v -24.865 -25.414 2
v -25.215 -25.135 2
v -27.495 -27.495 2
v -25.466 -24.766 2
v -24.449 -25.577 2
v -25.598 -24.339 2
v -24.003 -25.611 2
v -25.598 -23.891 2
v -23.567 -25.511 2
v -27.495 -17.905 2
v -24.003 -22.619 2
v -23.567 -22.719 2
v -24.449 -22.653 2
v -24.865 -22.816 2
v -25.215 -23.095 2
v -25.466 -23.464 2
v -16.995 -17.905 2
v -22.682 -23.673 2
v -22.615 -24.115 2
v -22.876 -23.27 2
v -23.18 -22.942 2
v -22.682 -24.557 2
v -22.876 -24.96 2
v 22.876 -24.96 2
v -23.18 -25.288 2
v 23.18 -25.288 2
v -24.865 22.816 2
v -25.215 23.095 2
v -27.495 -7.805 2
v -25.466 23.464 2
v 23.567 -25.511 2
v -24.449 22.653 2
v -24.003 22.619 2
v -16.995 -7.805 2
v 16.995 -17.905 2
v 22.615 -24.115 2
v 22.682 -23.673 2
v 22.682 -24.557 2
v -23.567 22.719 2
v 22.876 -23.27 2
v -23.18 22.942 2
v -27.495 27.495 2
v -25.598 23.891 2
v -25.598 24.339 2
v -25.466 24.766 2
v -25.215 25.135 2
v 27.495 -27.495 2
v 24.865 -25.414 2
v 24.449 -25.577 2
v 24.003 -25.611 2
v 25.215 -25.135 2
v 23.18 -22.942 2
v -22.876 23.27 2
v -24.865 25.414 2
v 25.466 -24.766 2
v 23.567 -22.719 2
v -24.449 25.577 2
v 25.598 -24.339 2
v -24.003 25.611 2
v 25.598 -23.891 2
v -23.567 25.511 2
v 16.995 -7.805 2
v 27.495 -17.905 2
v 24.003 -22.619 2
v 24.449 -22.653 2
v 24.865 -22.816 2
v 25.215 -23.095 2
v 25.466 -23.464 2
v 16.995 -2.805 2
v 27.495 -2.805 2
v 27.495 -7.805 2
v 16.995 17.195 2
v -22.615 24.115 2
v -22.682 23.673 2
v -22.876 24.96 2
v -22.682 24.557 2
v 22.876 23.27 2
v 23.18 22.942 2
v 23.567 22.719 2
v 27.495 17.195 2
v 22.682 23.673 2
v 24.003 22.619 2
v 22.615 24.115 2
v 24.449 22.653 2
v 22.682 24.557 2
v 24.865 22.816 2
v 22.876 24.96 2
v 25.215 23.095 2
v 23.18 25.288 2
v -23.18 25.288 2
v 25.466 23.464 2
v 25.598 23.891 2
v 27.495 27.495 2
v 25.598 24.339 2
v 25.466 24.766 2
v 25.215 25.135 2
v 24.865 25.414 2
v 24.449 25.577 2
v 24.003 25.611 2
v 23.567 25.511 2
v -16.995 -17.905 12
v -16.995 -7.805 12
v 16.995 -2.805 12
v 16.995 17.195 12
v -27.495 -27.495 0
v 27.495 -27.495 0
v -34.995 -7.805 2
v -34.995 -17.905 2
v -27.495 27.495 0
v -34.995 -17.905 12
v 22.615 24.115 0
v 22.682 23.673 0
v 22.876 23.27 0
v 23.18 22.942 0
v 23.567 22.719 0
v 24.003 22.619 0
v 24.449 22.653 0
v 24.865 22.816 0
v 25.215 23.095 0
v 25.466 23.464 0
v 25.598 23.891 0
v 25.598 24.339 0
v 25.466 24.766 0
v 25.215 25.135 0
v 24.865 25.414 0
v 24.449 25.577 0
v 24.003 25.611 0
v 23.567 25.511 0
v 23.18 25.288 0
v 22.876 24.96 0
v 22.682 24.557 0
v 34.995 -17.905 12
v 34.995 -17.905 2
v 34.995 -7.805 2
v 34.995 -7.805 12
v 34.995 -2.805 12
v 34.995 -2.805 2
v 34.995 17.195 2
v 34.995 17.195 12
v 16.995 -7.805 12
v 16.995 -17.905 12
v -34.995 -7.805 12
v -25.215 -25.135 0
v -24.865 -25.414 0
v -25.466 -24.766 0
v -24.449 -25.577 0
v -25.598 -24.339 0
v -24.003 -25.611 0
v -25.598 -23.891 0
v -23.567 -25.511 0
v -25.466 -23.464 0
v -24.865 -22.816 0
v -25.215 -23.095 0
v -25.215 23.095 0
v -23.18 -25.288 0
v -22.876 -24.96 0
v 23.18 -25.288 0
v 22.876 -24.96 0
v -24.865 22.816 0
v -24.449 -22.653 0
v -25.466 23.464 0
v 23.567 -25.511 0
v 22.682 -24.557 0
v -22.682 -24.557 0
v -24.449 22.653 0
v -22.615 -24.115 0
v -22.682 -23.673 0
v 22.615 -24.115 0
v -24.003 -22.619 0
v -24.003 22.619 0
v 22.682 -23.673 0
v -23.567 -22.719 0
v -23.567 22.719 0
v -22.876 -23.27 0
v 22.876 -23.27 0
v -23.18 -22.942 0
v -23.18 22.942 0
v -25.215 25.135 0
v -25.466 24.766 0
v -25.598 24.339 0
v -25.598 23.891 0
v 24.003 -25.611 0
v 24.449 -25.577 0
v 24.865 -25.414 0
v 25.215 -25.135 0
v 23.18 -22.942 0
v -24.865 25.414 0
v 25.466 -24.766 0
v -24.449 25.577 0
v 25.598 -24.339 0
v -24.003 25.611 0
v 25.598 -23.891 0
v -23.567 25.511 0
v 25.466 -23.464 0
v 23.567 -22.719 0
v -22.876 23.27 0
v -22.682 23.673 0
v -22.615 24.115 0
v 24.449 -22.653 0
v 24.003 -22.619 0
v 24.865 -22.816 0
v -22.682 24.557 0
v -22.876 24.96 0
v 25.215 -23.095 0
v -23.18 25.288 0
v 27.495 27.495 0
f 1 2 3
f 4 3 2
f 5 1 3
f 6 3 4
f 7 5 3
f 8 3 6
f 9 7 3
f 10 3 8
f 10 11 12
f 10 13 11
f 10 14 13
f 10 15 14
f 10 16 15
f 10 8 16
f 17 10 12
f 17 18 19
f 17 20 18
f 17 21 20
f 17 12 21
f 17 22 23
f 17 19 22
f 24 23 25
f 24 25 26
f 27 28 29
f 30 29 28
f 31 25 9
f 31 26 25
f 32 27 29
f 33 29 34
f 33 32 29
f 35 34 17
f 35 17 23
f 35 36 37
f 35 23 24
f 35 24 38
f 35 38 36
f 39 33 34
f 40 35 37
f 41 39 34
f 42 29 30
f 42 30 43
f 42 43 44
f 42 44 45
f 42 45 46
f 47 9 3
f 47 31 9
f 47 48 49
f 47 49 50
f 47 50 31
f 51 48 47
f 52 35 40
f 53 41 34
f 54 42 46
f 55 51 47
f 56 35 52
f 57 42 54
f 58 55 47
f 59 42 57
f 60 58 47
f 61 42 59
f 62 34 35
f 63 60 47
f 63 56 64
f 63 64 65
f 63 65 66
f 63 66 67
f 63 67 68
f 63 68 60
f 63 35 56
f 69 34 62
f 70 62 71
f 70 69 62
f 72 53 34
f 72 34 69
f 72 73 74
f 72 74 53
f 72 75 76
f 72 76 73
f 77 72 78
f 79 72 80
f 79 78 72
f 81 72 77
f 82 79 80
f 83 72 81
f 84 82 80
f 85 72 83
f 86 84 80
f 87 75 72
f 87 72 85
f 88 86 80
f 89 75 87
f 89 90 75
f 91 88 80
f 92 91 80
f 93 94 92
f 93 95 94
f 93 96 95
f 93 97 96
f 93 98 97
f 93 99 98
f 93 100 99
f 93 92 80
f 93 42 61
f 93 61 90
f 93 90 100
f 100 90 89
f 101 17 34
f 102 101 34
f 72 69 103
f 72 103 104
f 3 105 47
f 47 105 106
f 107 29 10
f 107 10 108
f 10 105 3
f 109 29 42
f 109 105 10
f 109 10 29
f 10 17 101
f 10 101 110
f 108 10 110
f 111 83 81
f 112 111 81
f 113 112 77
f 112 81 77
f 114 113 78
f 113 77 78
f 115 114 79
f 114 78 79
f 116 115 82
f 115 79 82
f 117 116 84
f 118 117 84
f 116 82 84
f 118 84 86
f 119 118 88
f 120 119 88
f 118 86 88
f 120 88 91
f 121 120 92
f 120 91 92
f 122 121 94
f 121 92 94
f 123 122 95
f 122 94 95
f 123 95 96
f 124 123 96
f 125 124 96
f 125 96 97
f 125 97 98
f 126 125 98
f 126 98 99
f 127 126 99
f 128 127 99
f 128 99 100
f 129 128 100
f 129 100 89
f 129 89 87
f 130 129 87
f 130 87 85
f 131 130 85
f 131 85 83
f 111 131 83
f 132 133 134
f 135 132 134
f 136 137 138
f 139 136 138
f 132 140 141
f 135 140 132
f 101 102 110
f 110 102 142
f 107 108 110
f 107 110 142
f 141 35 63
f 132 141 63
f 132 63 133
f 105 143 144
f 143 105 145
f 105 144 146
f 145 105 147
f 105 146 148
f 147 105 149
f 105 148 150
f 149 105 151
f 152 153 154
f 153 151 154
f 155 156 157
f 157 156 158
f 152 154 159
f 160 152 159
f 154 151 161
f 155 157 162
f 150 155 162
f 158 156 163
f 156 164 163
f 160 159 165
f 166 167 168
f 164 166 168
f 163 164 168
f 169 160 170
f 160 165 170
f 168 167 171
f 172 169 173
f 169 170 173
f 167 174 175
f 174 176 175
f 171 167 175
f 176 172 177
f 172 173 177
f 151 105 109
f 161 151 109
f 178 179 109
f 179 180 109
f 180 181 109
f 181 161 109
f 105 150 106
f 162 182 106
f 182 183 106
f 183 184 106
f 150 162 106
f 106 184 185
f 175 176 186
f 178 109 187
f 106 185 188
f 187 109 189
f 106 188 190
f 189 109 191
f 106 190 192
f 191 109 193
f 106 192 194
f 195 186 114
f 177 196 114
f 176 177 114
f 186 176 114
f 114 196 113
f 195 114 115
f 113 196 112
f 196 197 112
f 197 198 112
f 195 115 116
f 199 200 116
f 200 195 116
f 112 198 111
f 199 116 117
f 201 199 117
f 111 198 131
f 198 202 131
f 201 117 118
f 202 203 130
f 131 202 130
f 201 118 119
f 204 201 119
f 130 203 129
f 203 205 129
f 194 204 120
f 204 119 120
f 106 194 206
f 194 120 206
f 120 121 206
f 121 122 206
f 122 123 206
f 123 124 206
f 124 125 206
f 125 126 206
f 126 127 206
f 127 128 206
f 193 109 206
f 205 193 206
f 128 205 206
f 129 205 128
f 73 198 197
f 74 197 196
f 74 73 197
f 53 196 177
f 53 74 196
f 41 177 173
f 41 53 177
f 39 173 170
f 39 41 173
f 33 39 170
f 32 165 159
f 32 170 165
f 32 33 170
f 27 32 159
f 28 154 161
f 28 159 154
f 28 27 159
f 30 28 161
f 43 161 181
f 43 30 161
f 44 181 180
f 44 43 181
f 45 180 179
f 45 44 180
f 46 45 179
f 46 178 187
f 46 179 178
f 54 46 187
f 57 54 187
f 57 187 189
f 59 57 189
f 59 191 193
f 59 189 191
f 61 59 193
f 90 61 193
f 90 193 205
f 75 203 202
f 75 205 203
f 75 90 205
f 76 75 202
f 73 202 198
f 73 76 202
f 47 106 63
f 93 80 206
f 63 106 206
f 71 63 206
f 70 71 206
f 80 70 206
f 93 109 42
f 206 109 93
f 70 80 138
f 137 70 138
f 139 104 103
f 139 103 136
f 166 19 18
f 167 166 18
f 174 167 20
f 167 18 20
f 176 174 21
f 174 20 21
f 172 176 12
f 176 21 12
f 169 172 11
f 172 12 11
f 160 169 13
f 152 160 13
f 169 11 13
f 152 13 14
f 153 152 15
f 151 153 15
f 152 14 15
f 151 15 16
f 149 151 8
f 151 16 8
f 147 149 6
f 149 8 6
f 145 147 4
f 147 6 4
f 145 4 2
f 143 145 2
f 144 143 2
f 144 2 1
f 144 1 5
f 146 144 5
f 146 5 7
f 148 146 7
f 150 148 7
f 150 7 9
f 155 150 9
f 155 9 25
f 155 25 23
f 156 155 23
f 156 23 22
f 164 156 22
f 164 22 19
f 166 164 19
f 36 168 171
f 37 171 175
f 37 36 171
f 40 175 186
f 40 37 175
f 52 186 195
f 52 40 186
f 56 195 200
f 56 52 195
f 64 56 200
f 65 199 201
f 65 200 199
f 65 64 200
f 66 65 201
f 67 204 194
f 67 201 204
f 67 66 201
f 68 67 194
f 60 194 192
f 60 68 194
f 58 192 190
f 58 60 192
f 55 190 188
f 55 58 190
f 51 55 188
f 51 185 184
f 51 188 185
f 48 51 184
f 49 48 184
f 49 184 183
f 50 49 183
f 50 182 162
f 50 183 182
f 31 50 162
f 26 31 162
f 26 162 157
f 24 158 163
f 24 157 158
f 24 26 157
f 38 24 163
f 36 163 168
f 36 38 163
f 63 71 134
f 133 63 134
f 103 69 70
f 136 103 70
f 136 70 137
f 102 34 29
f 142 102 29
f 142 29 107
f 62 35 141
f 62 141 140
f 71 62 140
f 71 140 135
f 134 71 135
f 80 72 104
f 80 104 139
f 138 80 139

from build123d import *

# Parameters (mm, degrees)
SKETCH_2_W               = 54.99
SKETCH_2_H               = 54.99
EXTRUDE_1_DEPTH          = 2
SKETCH_3_R               = 1.5
CUT_EXTRUDE_1_DEPTH      = 39.935203223
MIRROR_2_COPY_1_SKETCH_R = 1.5
MIRROR_2_COPY_1_DEPTH    = 39.935203223
MIRROR_2_COPY_2_SKETCH_R = 1.5
MIRROR_2_COPY_2_DEPTH    = 39.935203223
SKETCH_4_W               = 18
SKETCH_4_H               = 20
EXTRUDE_2_DEPTH          = 10
SKETCH_5_W               = 18
SKETCH_5_H               = 10.1
EXTRUDE_3_DEPTH          = 10


with BuildPart() as part:
    # 草圖2 → 填料-伸長1 (new body)
    with BuildSketch(Plane.XY):
        Rectangle(SKETCH_2_W, SKETCH_2_H)
    extrude(amount=EXTRUDE_1_DEPTH)

    # 草圖3 → 除料-伸長1 (cut, through all)
    with BuildSketch(Plane.XY.offset(2)):
        with Locations((-24.115, -24.115)):
            Circle(SKETCH_3_R)
    cut_extrude_1 = extrude(amount=-CUT_EXTRUDE_1_DEPTH, mode=Mode.SUBTRACT)

    # 鏡射1: 除料-伸長1 across plane
    add(cut_extrude_1.mirror(Plane.ZX), mode=Mode.SUBTRACT)

    # 鏡射2 copy 1 sketch → 鏡射2 copy 1 (cut, through all)
    with BuildSketch(Plane(origin=(0, 0, 2), x_dir=(-1, 0, 0), z_dir=(0, 0, 1))):
        with Locations((-24.115, -24.115)):
            Circle(MIRROR_2_COPY_1_SKETCH_R)
    extrude(amount=-MIRROR_2_COPY_1_DEPTH, mode=Mode.SUBTRACT)

    # 鏡射2 copy 2 sketch → 鏡射2 copy 2 (cut, through all)
    with BuildSketch(Plane(origin=(0, 0, 2), x_dir=(-1, 0, 0), z_dir=(0, 0, 1))):
        with Locations((-24.115, 24.115)):
            Circle(MIRROR_2_COPY_2_SKETCH_R)
    extrude(amount=-MIRROR_2_COPY_2_DEPTH, mode=Mode.SUBTRACT)

    # 草圖4 → 填料-伸長2 (add)
    with BuildSketch(Plane.XY.offset(2)):
        with Locations((25.995, 7.195)):
            Rectangle(SKETCH_4_W, SKETCH_4_H)
    extrude(amount=EXTRUDE_2_DEPTH)

    # 草圖5 → 填料-伸長3 (add)
    with BuildSketch(Plane.XY.offset(2)):
        with Locations((25.995, -12.855)):
            Rectangle(SKETCH_5_W, SKETCH_5_H)
    extrude_3 = extrude(amount=EXTRUDE_3_DEPTH)

    # 鏡射3: 填料-伸長3 across plane
    add(extrude_3.mirror(Plane(origin=(0, 0, 0), x_dir=(0, 0, 1), z_dir=(1, 0, 0))))


solid = part.part
